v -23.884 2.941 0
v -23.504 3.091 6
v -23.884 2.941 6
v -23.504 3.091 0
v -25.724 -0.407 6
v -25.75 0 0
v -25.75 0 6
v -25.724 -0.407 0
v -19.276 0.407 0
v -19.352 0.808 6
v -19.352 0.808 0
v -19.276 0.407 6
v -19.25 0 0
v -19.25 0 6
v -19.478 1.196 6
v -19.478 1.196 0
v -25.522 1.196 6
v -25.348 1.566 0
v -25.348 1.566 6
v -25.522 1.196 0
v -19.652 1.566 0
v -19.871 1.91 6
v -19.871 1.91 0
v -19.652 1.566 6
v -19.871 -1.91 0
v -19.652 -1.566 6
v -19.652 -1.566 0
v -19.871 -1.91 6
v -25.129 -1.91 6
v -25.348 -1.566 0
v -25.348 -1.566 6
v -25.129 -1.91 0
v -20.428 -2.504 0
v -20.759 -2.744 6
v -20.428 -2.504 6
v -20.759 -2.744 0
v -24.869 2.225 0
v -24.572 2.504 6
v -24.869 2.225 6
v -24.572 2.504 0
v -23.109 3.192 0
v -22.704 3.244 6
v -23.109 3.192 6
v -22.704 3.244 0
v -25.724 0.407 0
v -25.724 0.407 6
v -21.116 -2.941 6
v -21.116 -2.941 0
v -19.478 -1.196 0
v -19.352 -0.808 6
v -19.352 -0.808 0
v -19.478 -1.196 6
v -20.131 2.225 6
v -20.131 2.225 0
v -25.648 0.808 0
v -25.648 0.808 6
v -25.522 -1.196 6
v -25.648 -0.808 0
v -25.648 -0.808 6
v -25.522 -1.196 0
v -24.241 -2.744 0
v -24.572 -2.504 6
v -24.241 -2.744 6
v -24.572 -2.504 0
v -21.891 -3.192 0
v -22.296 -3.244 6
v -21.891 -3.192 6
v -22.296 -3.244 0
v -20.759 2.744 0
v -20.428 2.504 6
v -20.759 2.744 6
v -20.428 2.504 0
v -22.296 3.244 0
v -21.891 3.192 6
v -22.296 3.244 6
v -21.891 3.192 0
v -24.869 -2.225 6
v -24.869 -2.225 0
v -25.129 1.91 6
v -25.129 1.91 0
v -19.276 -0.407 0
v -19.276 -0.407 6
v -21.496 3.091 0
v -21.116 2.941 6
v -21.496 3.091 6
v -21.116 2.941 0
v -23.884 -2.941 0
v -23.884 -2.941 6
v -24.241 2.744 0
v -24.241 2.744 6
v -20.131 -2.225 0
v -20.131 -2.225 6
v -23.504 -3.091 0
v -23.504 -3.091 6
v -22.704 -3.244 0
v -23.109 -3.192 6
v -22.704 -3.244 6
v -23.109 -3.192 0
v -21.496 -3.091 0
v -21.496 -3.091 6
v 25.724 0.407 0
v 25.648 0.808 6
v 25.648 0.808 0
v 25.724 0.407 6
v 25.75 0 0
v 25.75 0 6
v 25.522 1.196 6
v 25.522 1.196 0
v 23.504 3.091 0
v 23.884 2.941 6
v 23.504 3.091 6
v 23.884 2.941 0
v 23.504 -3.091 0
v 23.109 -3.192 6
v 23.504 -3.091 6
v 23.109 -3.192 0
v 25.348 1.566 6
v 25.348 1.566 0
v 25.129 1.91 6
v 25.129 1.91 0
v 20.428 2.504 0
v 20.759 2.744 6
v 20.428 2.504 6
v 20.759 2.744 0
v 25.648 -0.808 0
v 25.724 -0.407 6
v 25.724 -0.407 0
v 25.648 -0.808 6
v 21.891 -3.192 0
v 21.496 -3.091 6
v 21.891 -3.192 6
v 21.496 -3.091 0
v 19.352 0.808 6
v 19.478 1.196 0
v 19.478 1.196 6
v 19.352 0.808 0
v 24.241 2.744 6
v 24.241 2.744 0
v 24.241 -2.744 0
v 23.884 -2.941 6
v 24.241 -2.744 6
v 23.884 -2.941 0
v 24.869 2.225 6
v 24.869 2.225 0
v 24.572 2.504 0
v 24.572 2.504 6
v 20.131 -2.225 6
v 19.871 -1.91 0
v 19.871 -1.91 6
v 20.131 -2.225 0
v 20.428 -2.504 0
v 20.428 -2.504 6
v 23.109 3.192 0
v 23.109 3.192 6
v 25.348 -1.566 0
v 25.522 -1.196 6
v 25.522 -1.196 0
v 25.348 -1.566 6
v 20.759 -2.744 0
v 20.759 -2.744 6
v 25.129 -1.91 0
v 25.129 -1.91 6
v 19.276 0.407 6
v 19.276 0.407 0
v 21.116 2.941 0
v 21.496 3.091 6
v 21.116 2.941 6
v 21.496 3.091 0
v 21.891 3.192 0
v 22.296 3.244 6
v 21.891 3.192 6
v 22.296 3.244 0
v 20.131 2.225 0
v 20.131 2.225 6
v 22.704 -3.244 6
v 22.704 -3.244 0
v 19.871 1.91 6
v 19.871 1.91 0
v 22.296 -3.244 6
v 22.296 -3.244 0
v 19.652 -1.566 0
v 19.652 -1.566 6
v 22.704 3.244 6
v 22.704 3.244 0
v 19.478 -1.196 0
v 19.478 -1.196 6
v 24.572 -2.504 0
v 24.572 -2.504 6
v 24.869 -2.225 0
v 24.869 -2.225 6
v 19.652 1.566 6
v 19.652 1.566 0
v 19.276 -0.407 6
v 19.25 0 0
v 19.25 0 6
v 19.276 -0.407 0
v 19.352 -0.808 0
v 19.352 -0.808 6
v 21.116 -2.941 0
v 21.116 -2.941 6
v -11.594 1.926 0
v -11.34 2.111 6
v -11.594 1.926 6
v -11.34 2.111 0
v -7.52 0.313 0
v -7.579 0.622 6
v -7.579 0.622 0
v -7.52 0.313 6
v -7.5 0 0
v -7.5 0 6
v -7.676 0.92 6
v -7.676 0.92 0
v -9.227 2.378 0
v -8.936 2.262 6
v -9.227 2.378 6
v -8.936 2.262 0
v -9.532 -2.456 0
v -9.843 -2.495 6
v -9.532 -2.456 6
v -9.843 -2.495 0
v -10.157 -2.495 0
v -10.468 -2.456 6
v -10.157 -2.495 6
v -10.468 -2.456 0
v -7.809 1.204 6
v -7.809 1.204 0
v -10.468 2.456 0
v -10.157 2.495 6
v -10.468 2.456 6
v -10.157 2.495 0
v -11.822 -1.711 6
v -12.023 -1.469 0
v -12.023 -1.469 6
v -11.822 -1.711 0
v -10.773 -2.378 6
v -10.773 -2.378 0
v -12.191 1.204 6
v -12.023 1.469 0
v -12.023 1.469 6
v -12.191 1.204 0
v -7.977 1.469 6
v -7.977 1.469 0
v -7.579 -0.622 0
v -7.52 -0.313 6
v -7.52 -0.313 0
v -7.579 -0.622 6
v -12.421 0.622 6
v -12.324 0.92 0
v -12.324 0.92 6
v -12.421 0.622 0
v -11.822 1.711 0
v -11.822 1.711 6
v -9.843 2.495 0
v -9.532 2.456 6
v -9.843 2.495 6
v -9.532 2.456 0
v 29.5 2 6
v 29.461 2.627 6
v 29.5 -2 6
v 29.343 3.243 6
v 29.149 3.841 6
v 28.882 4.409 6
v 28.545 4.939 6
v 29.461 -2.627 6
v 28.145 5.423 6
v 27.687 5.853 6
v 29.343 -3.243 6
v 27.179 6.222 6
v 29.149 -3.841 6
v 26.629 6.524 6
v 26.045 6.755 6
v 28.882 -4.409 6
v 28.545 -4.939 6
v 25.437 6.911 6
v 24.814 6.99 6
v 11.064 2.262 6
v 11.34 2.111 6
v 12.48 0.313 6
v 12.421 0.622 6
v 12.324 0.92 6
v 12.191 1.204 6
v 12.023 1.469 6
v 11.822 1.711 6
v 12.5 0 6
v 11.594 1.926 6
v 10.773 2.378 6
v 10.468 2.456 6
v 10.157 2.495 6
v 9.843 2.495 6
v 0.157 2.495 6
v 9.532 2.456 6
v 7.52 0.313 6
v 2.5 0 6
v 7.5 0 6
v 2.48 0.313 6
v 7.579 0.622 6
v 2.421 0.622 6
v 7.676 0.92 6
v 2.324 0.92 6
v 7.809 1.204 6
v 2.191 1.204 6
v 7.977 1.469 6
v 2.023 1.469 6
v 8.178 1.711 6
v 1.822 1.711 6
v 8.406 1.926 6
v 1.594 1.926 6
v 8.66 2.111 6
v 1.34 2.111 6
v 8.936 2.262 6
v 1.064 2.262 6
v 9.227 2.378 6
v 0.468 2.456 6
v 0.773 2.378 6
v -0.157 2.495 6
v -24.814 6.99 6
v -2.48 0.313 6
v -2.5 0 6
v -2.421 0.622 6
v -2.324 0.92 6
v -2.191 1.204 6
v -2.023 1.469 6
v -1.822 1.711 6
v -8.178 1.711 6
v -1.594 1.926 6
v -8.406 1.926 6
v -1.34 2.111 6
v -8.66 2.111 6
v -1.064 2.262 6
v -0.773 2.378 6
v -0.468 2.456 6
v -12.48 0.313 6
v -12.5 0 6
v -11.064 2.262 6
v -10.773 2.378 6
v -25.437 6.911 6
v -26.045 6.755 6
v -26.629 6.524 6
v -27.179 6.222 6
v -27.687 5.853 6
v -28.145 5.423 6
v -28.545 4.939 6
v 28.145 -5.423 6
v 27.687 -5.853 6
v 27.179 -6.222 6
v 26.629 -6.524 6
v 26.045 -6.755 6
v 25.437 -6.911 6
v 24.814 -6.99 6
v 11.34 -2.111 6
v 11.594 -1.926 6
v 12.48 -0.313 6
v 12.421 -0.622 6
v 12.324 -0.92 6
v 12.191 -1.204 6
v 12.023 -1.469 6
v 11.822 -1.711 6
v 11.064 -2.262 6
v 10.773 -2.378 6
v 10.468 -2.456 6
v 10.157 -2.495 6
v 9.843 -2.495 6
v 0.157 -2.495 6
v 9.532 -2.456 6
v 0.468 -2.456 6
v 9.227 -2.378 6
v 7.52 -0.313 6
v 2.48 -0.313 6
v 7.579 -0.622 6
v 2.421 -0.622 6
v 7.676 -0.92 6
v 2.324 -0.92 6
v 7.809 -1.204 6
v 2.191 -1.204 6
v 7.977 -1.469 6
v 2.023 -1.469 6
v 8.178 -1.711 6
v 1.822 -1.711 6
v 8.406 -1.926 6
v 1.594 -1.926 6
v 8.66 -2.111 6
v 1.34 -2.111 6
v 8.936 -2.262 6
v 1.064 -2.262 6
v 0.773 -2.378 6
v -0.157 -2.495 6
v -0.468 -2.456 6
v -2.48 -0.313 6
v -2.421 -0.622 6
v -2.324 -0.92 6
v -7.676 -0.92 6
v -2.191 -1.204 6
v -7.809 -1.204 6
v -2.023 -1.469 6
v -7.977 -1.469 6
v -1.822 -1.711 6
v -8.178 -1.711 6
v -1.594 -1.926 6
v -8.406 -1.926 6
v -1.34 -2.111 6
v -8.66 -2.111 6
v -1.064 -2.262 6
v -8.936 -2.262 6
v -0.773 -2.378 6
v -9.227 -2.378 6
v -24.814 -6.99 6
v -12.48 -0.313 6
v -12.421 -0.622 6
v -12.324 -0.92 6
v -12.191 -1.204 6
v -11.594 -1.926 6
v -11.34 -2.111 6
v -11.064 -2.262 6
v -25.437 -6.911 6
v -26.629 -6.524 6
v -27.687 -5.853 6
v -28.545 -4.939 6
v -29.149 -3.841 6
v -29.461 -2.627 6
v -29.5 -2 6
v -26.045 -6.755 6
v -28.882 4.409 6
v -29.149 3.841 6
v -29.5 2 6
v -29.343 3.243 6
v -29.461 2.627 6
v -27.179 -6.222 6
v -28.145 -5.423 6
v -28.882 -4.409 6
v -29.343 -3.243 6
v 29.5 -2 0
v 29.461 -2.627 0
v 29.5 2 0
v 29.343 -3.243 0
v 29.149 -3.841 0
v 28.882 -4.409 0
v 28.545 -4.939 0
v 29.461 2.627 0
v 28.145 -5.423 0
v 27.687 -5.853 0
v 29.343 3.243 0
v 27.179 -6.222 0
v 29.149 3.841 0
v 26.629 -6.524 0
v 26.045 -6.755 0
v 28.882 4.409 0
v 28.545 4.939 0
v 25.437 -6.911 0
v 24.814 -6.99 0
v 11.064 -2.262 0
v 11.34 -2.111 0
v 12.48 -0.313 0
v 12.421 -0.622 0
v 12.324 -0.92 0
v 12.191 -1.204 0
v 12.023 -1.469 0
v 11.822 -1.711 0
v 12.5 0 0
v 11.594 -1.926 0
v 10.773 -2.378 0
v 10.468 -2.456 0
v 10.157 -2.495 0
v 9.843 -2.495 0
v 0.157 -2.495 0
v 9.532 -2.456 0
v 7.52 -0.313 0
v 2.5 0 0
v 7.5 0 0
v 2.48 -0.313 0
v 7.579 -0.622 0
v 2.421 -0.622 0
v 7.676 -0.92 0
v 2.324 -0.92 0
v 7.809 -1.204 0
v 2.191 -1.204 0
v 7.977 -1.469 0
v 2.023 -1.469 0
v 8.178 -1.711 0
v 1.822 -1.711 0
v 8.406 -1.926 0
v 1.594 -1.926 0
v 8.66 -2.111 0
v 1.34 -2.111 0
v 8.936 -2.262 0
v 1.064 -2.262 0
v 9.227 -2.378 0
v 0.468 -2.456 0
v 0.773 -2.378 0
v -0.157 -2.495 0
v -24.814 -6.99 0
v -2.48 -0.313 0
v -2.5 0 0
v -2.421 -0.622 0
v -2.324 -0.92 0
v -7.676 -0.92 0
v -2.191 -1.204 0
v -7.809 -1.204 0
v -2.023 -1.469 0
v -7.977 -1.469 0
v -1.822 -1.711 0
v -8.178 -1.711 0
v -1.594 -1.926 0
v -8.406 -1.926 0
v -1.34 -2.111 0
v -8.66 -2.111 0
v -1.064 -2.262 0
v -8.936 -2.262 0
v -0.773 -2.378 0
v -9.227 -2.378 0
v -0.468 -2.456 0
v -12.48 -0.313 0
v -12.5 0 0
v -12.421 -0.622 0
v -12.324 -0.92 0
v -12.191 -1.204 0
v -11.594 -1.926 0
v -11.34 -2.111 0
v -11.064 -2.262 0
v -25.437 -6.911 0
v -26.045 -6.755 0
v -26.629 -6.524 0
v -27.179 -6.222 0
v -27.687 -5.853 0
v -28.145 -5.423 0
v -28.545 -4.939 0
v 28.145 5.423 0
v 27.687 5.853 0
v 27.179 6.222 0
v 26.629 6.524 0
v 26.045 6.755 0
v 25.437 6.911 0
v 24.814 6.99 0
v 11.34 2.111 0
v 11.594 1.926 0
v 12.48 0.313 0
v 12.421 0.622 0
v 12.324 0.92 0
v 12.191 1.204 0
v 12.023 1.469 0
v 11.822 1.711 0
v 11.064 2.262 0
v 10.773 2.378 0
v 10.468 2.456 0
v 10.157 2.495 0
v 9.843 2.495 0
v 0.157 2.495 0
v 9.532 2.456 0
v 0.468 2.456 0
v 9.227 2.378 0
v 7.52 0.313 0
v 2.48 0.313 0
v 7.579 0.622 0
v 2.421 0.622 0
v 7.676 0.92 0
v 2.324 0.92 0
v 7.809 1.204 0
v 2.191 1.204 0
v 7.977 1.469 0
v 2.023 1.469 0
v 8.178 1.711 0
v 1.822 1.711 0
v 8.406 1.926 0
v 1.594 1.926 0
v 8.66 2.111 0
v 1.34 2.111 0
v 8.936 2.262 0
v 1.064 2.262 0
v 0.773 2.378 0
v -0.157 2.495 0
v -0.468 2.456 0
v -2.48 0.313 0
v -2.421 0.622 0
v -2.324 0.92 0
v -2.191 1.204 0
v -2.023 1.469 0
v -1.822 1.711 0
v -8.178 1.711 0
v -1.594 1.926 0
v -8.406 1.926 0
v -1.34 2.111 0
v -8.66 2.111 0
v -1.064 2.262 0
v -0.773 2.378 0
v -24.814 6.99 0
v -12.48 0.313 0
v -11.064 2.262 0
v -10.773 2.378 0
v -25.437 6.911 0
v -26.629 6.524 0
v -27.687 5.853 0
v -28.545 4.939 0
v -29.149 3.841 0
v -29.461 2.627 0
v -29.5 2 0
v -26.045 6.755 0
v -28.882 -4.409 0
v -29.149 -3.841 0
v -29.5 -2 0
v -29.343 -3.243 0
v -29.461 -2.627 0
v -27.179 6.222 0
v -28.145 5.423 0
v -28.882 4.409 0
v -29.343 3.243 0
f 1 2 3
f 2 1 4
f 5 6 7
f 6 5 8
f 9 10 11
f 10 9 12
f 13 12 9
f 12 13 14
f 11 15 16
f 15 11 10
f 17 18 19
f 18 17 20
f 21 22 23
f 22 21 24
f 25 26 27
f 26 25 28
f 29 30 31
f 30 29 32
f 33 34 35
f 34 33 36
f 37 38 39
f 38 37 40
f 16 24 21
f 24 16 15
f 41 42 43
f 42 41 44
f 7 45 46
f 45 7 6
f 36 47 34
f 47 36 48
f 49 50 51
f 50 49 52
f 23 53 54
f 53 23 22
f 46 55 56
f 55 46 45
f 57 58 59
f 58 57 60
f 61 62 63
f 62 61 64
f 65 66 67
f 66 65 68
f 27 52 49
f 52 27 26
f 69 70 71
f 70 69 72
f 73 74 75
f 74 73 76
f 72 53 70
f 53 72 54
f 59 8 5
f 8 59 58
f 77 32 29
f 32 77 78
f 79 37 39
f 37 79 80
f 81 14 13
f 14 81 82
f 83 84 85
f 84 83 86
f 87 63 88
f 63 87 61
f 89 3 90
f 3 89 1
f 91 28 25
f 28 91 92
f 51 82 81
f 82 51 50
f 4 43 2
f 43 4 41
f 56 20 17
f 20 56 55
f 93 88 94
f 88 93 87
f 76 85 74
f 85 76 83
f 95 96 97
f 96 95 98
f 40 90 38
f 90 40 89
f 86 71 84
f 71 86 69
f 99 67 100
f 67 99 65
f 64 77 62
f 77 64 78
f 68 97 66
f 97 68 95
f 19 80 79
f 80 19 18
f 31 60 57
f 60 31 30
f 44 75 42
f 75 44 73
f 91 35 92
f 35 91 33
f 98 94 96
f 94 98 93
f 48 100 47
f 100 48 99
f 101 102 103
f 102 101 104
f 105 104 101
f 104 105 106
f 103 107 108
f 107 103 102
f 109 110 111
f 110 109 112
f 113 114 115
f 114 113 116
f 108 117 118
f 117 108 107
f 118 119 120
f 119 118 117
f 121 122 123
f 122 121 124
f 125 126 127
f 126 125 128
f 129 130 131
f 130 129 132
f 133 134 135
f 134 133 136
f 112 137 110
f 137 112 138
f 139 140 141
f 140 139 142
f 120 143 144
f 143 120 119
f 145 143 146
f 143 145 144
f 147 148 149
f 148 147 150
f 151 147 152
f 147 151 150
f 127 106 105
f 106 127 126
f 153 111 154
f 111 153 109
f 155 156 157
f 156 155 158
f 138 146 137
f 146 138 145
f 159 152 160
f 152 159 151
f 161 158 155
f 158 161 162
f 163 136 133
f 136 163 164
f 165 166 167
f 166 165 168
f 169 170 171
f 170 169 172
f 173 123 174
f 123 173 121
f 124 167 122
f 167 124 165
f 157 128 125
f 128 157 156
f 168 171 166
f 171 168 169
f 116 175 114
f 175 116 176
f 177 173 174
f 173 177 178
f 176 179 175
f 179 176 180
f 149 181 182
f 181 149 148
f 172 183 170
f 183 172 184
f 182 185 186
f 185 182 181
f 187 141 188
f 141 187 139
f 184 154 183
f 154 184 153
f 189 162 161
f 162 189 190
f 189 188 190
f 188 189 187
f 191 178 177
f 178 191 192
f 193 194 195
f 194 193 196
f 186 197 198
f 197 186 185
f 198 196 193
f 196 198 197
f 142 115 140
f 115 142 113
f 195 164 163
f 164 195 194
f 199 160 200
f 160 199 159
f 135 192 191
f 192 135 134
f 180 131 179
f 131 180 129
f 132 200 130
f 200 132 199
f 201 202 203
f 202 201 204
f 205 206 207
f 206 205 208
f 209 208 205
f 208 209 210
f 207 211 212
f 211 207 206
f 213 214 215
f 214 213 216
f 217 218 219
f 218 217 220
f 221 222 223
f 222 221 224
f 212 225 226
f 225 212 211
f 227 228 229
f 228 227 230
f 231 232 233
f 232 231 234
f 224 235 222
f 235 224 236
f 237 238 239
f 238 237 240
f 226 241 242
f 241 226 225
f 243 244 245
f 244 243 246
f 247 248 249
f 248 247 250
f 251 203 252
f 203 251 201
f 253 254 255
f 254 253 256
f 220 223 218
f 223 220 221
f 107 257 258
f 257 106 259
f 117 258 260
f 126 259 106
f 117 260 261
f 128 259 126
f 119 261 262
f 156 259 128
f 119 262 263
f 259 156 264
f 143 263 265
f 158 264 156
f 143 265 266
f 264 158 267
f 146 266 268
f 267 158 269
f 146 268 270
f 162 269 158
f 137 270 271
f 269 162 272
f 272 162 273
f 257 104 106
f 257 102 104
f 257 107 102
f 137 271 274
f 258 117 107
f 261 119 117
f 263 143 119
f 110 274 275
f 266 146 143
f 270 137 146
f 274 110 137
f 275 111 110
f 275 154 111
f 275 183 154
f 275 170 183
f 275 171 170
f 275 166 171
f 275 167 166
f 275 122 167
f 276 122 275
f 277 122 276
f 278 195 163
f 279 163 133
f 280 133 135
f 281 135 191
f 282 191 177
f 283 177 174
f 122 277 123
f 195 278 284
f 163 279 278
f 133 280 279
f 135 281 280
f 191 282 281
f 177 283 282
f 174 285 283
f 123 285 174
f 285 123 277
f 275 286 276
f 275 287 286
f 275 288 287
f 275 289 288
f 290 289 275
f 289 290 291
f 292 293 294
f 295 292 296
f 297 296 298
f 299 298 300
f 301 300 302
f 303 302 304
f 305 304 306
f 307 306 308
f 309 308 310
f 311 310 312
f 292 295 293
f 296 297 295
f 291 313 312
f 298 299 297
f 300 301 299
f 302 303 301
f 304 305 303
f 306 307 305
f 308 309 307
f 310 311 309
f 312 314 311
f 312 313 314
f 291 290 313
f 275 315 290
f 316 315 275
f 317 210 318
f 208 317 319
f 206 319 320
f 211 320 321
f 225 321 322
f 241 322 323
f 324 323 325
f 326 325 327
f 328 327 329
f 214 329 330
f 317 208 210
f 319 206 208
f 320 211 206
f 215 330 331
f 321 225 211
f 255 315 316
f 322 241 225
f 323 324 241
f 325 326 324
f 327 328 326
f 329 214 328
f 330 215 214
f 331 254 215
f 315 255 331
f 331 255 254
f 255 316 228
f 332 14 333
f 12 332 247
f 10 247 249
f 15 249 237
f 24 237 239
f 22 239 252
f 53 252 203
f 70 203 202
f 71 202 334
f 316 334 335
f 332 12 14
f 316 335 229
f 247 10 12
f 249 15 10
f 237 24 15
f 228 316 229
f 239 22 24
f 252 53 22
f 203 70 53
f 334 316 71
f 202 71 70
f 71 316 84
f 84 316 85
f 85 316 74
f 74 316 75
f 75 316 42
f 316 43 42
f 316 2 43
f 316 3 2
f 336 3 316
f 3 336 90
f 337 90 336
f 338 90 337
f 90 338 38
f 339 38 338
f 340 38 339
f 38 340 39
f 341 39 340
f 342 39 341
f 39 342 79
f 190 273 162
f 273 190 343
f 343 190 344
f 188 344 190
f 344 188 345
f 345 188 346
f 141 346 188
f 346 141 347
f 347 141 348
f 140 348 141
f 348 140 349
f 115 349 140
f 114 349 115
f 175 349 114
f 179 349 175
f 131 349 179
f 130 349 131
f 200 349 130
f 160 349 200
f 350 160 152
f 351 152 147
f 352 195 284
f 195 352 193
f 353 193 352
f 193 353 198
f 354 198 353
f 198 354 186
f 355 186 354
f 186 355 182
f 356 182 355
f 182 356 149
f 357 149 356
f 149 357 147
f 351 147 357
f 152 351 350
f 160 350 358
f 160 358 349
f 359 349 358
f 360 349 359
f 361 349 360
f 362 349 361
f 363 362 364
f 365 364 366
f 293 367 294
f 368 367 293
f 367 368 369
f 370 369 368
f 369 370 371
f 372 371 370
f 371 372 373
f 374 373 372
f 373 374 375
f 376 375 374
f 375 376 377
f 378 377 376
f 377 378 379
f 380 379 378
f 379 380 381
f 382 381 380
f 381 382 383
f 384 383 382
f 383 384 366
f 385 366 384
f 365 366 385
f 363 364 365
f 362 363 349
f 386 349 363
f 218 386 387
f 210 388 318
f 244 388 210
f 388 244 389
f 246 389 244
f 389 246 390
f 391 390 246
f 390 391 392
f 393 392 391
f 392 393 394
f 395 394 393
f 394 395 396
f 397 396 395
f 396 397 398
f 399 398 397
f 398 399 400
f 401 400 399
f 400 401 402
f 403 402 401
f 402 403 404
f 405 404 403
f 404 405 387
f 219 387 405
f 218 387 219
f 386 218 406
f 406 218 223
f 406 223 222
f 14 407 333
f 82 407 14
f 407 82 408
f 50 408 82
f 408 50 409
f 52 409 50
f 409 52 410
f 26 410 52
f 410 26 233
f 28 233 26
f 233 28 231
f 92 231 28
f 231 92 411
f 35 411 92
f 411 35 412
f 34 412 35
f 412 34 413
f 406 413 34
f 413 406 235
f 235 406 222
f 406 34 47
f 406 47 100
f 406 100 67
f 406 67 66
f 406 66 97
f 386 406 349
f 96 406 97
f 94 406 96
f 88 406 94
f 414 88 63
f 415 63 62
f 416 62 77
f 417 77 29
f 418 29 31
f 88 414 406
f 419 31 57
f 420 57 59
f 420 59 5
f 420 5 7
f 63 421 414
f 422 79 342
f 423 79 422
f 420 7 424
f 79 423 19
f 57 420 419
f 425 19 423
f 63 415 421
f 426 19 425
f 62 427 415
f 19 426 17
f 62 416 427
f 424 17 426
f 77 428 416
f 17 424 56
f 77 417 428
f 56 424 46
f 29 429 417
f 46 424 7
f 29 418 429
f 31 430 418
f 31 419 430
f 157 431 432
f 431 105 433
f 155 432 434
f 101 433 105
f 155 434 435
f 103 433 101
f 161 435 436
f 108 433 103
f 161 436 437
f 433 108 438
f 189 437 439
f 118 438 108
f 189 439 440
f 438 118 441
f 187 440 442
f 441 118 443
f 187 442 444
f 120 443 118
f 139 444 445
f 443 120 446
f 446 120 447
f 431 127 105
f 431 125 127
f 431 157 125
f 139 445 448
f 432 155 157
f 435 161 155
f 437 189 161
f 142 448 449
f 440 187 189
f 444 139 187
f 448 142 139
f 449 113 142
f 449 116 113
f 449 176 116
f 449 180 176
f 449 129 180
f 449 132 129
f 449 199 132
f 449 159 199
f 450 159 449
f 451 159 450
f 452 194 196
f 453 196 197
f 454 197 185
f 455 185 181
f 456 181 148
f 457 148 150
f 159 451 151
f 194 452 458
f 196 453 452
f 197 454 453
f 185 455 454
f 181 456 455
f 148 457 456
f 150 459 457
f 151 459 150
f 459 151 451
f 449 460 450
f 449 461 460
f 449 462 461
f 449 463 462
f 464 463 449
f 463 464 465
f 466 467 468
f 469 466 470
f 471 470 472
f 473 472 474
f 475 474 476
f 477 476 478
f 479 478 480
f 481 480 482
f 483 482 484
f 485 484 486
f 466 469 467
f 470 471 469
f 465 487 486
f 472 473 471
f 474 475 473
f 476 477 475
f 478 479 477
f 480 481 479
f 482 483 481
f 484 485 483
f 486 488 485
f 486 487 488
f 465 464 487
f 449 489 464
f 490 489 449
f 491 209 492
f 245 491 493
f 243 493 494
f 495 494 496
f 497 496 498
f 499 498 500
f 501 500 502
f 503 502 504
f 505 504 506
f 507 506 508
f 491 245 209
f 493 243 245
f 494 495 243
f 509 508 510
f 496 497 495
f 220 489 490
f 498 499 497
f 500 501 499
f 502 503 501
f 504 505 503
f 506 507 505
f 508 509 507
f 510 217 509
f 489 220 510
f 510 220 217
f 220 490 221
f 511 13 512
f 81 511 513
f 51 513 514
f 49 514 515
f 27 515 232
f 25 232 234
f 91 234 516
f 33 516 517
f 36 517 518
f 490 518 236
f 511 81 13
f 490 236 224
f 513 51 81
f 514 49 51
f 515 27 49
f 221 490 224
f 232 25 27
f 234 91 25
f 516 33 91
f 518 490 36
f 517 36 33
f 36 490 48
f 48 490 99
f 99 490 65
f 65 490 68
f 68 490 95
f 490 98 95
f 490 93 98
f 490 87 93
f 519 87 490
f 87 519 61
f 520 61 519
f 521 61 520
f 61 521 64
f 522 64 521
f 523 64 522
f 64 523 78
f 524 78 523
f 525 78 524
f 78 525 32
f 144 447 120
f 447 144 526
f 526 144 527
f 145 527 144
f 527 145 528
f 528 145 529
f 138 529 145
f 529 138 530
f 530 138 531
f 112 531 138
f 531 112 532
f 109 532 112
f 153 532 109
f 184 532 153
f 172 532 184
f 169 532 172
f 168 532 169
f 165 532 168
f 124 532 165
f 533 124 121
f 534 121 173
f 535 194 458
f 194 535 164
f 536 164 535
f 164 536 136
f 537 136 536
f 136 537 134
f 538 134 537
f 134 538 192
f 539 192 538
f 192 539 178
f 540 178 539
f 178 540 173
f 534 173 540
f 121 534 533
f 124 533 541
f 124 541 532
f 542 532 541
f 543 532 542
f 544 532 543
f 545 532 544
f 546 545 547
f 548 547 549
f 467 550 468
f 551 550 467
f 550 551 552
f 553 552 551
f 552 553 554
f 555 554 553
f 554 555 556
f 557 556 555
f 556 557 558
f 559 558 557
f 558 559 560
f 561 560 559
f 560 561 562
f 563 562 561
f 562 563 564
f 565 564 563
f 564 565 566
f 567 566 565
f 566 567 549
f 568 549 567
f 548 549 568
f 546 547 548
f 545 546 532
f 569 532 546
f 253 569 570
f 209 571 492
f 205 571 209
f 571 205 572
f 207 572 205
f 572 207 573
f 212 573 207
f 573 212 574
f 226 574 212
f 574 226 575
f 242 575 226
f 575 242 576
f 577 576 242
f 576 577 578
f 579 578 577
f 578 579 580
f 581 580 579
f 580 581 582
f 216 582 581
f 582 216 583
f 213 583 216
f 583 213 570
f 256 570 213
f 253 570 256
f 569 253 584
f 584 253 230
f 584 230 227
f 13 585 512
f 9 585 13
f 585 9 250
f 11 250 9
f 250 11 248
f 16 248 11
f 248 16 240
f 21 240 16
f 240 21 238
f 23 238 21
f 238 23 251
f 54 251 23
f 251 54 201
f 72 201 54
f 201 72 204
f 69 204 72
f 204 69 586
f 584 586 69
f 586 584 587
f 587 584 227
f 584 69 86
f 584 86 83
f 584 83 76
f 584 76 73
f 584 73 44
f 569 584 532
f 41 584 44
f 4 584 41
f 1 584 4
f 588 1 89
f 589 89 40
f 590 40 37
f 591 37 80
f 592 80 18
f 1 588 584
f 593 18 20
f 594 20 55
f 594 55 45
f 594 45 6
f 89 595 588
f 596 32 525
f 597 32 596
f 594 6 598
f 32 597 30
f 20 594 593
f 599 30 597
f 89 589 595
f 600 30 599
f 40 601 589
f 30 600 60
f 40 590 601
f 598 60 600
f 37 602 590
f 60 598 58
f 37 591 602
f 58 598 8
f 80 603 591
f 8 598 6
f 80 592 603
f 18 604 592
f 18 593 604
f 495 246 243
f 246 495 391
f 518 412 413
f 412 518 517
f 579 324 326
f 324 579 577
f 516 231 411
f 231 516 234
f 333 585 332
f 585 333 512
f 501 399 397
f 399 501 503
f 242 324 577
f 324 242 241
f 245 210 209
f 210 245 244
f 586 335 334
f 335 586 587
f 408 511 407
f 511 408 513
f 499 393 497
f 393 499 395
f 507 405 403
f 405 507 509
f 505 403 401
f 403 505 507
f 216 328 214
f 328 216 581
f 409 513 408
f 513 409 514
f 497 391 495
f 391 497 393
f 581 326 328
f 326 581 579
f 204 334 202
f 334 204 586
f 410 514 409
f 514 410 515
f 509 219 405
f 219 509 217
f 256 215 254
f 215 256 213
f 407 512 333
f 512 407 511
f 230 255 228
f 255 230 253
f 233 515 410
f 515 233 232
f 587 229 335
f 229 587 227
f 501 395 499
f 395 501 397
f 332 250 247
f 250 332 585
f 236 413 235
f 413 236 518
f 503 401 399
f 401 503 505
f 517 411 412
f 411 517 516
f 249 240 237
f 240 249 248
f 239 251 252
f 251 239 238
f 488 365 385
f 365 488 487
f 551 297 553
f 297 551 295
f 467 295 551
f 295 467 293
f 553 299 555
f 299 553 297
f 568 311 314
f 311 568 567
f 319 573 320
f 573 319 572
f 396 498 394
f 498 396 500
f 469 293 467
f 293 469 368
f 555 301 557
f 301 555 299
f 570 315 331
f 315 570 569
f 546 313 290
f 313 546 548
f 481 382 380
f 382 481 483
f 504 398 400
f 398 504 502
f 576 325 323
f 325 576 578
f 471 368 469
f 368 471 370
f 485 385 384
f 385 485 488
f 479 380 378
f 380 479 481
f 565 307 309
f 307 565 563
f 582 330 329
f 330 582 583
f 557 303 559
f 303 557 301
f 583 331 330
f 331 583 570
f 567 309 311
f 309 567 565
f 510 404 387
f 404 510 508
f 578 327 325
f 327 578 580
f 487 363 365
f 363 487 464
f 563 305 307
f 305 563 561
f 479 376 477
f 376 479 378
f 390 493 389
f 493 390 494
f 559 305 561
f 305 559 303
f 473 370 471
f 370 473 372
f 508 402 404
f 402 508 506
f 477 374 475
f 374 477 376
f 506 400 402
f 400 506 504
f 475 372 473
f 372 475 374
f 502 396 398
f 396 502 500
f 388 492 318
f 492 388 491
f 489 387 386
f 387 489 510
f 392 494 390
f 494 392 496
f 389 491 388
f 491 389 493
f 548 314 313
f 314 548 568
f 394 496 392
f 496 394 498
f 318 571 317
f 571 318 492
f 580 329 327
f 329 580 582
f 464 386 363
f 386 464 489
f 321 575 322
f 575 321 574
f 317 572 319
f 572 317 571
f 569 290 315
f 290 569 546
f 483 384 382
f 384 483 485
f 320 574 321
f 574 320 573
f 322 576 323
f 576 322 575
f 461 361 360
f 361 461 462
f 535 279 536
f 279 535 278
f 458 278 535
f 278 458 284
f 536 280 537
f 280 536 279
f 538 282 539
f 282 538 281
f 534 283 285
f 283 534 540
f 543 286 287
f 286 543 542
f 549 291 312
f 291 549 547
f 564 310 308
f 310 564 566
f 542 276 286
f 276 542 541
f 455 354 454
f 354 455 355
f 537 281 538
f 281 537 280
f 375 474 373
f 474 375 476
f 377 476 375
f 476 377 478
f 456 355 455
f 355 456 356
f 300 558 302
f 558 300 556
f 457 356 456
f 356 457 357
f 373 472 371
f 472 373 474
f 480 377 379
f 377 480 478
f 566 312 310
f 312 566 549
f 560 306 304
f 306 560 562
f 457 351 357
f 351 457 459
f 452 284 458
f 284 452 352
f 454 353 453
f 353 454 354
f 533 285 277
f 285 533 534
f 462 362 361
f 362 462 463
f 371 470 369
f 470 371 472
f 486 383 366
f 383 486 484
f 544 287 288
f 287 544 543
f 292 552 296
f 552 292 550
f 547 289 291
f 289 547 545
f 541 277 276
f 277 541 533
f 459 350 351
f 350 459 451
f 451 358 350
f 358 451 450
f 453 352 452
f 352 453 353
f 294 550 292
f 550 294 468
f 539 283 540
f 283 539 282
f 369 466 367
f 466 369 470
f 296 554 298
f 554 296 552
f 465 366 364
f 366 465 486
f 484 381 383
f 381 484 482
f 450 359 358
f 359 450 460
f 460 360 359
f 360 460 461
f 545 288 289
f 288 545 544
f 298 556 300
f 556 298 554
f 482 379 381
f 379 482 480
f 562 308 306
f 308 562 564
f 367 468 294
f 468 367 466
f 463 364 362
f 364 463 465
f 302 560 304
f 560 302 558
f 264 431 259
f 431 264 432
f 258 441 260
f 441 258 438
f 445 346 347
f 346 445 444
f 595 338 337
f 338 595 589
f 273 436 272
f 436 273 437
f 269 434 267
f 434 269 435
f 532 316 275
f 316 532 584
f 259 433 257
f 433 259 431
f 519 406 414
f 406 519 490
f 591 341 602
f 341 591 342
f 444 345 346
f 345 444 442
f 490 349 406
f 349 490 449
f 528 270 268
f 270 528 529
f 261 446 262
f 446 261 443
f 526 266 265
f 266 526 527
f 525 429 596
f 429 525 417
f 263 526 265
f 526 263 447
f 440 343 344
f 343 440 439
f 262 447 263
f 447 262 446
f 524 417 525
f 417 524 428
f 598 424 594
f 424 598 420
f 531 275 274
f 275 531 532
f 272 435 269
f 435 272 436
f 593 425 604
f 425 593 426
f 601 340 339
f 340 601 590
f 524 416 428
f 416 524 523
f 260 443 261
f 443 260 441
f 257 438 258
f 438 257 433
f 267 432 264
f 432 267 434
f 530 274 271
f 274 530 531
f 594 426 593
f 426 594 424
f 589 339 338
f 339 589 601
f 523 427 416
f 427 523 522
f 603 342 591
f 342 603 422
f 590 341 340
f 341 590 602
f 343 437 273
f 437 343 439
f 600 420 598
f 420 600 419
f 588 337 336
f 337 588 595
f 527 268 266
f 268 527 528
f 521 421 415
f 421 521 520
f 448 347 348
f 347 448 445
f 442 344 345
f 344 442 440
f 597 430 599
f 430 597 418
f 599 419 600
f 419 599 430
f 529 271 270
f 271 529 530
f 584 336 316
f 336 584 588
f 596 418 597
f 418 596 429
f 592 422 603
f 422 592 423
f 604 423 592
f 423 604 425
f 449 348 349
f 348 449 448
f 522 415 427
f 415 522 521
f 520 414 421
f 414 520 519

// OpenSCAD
$fn = 50;


difference() {
	union() {
		hull() {
			translate(v = [-24.5000000000, 2.0000000000, 0]) {
				cylinder(h = 6, r = 5);
			}
			translate(v = [24.5000000000, 2.0000000000, 0]) {
				cylinder(h = 6, r = 5);
			}
			translate(v = [-24.5000000000, -2.0000000000, 0]) {
				cylinder(h = 6, r = 5);
			}
			translate(v = [24.5000000000, -2.0000000000, 0]) {
				cylinder(h = 6, r = 5);
			}
		}
	}
	union() {
		#translate(v = [-22.5000000000, 0.0000000000, 0]) {
			cylinder(h = 6, r = 3.2500000000);
		}
		#translate(v = [22.5000000000, 0.0000000000, 0]) {
			cylinder(h = 6, r = 3.2500000000);
		}
		#translate(v = [-22.5000000000, 0.0000000000, -100.0000000000]) {
			cylinder(h = 200, r = 3.2500000000);
		}
		#translate(v = [-22.5000000000, 0.0000000000, -100.0000000000]) {
			cylinder(h = 200, r = 3.2500000000);
		}
		#translate(v = [22.5000000000, 0.0000000000, -100.0000000000]) {
			cylinder(h = 200, r = 3.2500000000);
		}
		#translate(v = [22.5000000000, 0.0000000000, -100.0000000000]) {
			cylinder(h = 200, r = 3.2500000000);
		}
		#translate(v = [-22.5000000000, 0.0000000000, 0]) {
			cylinder(h = 6, r = 1.8000000000);
		}
		#translate(v = [22.5000000000, 0.0000000000, 0]) {
			cylinder(h = 6, r = 1.8000000000);
		}
		#translate(v = [-22.5000000000, 0.0000000000, 0]) {
			cylinder(h = 6, r = 1.8000000000);
		}
		#translate(v = [22.5000000000, 0.0000000000, 0]) {
			cylinder(h = 6, r = 1.8000000000);
		}
		#translate(v = [-22.5000000000, 0.0000000000, 0]) {
			cylinder(h = 6, r = 1.8000000000);
		}
		#translate(v = [22.5000000000, 0.0000000000, 0]) {
			cylinder(h = 6, r = 1.8000000000);
		}
		#translate(v = [-10.0000000000, 0, 0]) {
			cylinder(h = 6, r = 2.5000000000);
		}
		#cylinder(h = 6, r = 2.5000000000);
		#translate(v = [10.0000000000, 0, 0]) {
			cylinder(h = 6, r = 2.5000000000);
		}
	}
}
